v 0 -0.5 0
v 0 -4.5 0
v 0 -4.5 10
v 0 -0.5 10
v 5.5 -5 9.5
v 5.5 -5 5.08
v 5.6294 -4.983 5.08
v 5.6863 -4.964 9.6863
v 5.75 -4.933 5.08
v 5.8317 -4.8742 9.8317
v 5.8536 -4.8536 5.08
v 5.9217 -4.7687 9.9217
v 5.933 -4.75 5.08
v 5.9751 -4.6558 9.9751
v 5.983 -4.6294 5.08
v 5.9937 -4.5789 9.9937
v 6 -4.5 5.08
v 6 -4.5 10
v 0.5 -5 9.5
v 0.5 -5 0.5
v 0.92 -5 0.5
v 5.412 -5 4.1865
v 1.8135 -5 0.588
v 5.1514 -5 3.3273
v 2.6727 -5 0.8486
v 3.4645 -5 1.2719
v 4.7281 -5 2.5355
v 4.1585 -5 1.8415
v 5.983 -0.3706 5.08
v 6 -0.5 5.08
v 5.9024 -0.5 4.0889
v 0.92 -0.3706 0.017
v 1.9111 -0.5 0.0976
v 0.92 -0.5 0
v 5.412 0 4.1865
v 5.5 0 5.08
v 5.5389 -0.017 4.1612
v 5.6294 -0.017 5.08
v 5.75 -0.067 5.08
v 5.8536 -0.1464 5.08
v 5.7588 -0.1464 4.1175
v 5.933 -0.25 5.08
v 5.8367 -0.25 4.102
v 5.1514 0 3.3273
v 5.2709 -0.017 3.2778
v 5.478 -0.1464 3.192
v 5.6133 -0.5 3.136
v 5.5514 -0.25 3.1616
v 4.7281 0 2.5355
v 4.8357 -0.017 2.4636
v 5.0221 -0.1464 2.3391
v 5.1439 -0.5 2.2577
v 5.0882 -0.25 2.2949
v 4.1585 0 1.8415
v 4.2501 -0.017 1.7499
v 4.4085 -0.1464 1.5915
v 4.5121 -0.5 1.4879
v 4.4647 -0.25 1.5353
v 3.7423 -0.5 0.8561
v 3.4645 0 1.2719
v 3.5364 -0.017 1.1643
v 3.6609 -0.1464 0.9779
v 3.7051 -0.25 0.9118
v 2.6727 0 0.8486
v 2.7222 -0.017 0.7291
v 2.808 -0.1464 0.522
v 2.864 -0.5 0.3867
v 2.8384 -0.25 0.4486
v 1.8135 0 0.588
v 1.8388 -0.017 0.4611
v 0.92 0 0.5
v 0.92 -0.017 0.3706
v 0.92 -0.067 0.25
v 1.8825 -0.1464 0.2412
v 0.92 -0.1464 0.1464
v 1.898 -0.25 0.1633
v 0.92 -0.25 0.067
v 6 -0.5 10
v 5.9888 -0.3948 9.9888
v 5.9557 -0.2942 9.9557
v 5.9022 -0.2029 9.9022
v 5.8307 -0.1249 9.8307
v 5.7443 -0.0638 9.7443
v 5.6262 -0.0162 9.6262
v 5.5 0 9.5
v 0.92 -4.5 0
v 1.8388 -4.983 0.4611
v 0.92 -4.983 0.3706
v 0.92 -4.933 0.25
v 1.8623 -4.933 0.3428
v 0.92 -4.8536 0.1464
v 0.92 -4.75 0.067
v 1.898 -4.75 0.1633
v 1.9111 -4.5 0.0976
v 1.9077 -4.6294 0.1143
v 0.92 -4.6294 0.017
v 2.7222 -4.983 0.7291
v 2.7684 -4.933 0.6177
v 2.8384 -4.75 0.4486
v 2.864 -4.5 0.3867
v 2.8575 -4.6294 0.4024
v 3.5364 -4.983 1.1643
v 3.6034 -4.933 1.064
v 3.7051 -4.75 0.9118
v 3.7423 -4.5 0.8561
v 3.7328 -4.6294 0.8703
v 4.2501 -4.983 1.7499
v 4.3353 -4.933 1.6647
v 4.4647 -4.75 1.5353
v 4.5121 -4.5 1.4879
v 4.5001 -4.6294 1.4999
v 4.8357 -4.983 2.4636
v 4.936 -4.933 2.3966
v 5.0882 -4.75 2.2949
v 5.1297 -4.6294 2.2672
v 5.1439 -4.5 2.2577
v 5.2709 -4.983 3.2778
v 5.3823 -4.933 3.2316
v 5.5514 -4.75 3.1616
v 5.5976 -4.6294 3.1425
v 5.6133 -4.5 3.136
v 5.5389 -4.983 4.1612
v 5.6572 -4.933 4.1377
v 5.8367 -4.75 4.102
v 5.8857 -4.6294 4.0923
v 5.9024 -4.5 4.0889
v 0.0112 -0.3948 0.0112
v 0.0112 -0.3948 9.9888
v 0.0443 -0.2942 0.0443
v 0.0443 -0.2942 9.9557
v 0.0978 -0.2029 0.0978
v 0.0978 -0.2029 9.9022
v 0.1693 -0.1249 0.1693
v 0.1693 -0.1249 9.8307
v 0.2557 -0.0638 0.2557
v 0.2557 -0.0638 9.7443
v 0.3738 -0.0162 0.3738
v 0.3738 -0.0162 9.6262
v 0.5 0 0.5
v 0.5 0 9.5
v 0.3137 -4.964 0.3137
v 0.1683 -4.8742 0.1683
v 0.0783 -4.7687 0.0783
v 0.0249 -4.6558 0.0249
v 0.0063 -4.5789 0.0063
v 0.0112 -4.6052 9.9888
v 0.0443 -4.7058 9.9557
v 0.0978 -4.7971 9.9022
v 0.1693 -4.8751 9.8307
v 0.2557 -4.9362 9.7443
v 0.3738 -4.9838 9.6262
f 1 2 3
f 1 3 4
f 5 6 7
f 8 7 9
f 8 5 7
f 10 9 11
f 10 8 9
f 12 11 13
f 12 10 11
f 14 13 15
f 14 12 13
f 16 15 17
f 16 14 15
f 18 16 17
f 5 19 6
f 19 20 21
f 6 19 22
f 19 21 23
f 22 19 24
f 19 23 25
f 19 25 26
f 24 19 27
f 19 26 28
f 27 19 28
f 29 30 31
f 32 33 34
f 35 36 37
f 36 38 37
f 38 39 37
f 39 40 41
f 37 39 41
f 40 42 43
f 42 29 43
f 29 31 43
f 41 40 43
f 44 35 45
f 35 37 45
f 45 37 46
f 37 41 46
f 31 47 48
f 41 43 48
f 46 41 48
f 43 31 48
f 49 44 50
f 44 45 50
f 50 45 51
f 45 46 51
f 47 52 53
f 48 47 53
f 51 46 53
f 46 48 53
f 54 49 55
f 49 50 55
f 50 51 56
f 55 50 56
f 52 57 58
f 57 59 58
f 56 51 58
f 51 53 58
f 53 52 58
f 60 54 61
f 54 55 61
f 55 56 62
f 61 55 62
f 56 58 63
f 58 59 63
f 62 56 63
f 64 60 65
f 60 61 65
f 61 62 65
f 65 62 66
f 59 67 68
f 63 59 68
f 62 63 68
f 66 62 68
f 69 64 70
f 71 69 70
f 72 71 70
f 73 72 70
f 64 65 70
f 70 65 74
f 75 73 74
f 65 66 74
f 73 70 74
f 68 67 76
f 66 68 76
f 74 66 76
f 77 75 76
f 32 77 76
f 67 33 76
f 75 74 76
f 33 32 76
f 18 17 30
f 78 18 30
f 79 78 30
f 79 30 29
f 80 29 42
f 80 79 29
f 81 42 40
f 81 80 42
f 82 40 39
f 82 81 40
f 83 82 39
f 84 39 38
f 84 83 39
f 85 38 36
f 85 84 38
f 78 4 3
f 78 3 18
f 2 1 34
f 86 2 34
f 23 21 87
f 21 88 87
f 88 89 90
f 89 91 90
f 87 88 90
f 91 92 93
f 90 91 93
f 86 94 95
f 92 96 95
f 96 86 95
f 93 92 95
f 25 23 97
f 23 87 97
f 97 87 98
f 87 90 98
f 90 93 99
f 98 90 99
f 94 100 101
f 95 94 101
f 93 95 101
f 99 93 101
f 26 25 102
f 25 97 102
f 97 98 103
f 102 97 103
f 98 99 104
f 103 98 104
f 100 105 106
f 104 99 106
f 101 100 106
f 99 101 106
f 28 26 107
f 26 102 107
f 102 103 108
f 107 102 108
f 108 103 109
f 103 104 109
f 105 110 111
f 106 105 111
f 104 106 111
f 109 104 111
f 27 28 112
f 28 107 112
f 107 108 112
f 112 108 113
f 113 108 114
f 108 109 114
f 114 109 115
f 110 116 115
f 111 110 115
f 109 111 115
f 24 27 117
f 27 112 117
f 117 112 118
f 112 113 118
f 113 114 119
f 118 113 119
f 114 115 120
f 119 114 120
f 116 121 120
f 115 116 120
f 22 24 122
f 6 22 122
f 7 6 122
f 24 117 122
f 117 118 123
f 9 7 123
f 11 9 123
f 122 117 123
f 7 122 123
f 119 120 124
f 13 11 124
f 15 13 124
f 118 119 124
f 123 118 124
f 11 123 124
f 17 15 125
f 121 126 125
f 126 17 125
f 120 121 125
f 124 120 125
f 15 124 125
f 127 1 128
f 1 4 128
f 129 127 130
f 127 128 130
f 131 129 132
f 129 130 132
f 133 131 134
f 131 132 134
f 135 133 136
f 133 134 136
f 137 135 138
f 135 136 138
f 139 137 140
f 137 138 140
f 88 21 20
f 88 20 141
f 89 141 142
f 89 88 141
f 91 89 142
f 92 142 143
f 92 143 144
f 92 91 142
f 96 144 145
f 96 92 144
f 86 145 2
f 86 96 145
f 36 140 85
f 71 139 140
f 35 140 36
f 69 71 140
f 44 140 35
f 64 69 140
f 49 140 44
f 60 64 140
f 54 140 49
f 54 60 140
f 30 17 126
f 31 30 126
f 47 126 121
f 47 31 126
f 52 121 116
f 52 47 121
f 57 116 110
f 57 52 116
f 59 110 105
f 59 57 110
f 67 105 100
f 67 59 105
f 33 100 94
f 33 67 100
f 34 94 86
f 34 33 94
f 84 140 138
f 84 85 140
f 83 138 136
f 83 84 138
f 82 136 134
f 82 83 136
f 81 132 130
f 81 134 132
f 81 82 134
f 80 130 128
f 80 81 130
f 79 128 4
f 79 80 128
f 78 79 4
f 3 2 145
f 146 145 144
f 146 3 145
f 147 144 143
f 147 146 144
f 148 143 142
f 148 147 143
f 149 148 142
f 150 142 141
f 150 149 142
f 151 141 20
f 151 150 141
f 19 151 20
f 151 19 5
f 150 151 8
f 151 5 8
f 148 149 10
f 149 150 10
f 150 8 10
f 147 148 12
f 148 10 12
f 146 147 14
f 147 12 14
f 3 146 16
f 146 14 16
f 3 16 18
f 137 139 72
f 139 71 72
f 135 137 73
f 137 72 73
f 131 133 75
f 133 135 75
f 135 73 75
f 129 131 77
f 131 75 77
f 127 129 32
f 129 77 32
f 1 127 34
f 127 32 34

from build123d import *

# Parameters (mm, degrees)
F0_W        = 6
F0_H        = 5
F1_DEPTH    = 10
F2_R        = 0.5
F3_T1_DEPTH = 5
F3_T4_ANGLE = 90
F3_T6_ANGLE = 90


# Not quite as in the source:
# - a fillet or chamfer that OpenCascade refuses, or shapes differently, is made with other operations: its cross-section is extruded or revolved along the edge and cut away or added


with BuildPart() as f1:
    # F0 (on Top) → F1 (new body)
    with BuildSketch(Plane.XY):
        with Locations((3, -2.5)):
            Rectangle(F0_W, F0_H)
    extrude(amount=F1_DEPTH)

    # F2
    f2_edges = [f1.edges().sort_by_distance(p)[0] for p in [
        (6, 0, 5),
        (0, 0, 5),
        (3, 0, 0),
        (3, 0, 10),
        (3, -5, 0),
        (0, -5, 5),
        (6, -5, 5),
        (3, -5, 10),
    ]]
    fillet(f2_edges, radius=F2_R)

    # F3: fillet of radius 5.08 on 1 edges, made by hand

    # F3_s2 → F3_t1 (cut)
    with BuildSketch(Plane.XZ):
        with BuildLine():
            ThreePointArc((6, 5.08), (4.5121024484, 1.4878975516), (0.92, 0))
            Line((0.92, 0), (6, 0))
            Line((6, 0), (6, 5.08))
        make_face()
    extrude(amount=F3_T1_DEPTH, mode=Mode.SUBTRACT)

    # F3_s3 → F3_t4 (revolve, cut)
    with BuildSketch(Plane.YZ.offset(0.92)):
        with BuildLine():
            ThreePointArc((-5, 0.5), (-4.8535533906, 0.1464466094), (-4.5, 0))
            Line((-4.5, 0), (-5, 0))
            Line((-5, 0), (-5, 0.5))
        make_face()
    revolve(axis=Axis((0.92, -5, 5.08), (0, -1, 0)), revolution_arc=F3_T4_ANGLE, mode=Mode.SUBTRACT)

    # F3_s5 → F3_t6 (revolve, cut)
    with BuildSketch(Plane.XY.offset(5.08)):
        with BuildLine():
            ThreePointArc((5.5, 0), (5.8535533906, -0.1464466094), (6, -0.5))
            Line((6, -0.5), (6, 0))
            Line((6, 0), (5.5, 0))
        make_face()
    revolve(axis=Axis((0.92, 0, 5.08), (0, 1, 0)), revolution_arc=F3_T6_ANGLE, mode=Mode.SUBTRACT)


solid = f1.part
